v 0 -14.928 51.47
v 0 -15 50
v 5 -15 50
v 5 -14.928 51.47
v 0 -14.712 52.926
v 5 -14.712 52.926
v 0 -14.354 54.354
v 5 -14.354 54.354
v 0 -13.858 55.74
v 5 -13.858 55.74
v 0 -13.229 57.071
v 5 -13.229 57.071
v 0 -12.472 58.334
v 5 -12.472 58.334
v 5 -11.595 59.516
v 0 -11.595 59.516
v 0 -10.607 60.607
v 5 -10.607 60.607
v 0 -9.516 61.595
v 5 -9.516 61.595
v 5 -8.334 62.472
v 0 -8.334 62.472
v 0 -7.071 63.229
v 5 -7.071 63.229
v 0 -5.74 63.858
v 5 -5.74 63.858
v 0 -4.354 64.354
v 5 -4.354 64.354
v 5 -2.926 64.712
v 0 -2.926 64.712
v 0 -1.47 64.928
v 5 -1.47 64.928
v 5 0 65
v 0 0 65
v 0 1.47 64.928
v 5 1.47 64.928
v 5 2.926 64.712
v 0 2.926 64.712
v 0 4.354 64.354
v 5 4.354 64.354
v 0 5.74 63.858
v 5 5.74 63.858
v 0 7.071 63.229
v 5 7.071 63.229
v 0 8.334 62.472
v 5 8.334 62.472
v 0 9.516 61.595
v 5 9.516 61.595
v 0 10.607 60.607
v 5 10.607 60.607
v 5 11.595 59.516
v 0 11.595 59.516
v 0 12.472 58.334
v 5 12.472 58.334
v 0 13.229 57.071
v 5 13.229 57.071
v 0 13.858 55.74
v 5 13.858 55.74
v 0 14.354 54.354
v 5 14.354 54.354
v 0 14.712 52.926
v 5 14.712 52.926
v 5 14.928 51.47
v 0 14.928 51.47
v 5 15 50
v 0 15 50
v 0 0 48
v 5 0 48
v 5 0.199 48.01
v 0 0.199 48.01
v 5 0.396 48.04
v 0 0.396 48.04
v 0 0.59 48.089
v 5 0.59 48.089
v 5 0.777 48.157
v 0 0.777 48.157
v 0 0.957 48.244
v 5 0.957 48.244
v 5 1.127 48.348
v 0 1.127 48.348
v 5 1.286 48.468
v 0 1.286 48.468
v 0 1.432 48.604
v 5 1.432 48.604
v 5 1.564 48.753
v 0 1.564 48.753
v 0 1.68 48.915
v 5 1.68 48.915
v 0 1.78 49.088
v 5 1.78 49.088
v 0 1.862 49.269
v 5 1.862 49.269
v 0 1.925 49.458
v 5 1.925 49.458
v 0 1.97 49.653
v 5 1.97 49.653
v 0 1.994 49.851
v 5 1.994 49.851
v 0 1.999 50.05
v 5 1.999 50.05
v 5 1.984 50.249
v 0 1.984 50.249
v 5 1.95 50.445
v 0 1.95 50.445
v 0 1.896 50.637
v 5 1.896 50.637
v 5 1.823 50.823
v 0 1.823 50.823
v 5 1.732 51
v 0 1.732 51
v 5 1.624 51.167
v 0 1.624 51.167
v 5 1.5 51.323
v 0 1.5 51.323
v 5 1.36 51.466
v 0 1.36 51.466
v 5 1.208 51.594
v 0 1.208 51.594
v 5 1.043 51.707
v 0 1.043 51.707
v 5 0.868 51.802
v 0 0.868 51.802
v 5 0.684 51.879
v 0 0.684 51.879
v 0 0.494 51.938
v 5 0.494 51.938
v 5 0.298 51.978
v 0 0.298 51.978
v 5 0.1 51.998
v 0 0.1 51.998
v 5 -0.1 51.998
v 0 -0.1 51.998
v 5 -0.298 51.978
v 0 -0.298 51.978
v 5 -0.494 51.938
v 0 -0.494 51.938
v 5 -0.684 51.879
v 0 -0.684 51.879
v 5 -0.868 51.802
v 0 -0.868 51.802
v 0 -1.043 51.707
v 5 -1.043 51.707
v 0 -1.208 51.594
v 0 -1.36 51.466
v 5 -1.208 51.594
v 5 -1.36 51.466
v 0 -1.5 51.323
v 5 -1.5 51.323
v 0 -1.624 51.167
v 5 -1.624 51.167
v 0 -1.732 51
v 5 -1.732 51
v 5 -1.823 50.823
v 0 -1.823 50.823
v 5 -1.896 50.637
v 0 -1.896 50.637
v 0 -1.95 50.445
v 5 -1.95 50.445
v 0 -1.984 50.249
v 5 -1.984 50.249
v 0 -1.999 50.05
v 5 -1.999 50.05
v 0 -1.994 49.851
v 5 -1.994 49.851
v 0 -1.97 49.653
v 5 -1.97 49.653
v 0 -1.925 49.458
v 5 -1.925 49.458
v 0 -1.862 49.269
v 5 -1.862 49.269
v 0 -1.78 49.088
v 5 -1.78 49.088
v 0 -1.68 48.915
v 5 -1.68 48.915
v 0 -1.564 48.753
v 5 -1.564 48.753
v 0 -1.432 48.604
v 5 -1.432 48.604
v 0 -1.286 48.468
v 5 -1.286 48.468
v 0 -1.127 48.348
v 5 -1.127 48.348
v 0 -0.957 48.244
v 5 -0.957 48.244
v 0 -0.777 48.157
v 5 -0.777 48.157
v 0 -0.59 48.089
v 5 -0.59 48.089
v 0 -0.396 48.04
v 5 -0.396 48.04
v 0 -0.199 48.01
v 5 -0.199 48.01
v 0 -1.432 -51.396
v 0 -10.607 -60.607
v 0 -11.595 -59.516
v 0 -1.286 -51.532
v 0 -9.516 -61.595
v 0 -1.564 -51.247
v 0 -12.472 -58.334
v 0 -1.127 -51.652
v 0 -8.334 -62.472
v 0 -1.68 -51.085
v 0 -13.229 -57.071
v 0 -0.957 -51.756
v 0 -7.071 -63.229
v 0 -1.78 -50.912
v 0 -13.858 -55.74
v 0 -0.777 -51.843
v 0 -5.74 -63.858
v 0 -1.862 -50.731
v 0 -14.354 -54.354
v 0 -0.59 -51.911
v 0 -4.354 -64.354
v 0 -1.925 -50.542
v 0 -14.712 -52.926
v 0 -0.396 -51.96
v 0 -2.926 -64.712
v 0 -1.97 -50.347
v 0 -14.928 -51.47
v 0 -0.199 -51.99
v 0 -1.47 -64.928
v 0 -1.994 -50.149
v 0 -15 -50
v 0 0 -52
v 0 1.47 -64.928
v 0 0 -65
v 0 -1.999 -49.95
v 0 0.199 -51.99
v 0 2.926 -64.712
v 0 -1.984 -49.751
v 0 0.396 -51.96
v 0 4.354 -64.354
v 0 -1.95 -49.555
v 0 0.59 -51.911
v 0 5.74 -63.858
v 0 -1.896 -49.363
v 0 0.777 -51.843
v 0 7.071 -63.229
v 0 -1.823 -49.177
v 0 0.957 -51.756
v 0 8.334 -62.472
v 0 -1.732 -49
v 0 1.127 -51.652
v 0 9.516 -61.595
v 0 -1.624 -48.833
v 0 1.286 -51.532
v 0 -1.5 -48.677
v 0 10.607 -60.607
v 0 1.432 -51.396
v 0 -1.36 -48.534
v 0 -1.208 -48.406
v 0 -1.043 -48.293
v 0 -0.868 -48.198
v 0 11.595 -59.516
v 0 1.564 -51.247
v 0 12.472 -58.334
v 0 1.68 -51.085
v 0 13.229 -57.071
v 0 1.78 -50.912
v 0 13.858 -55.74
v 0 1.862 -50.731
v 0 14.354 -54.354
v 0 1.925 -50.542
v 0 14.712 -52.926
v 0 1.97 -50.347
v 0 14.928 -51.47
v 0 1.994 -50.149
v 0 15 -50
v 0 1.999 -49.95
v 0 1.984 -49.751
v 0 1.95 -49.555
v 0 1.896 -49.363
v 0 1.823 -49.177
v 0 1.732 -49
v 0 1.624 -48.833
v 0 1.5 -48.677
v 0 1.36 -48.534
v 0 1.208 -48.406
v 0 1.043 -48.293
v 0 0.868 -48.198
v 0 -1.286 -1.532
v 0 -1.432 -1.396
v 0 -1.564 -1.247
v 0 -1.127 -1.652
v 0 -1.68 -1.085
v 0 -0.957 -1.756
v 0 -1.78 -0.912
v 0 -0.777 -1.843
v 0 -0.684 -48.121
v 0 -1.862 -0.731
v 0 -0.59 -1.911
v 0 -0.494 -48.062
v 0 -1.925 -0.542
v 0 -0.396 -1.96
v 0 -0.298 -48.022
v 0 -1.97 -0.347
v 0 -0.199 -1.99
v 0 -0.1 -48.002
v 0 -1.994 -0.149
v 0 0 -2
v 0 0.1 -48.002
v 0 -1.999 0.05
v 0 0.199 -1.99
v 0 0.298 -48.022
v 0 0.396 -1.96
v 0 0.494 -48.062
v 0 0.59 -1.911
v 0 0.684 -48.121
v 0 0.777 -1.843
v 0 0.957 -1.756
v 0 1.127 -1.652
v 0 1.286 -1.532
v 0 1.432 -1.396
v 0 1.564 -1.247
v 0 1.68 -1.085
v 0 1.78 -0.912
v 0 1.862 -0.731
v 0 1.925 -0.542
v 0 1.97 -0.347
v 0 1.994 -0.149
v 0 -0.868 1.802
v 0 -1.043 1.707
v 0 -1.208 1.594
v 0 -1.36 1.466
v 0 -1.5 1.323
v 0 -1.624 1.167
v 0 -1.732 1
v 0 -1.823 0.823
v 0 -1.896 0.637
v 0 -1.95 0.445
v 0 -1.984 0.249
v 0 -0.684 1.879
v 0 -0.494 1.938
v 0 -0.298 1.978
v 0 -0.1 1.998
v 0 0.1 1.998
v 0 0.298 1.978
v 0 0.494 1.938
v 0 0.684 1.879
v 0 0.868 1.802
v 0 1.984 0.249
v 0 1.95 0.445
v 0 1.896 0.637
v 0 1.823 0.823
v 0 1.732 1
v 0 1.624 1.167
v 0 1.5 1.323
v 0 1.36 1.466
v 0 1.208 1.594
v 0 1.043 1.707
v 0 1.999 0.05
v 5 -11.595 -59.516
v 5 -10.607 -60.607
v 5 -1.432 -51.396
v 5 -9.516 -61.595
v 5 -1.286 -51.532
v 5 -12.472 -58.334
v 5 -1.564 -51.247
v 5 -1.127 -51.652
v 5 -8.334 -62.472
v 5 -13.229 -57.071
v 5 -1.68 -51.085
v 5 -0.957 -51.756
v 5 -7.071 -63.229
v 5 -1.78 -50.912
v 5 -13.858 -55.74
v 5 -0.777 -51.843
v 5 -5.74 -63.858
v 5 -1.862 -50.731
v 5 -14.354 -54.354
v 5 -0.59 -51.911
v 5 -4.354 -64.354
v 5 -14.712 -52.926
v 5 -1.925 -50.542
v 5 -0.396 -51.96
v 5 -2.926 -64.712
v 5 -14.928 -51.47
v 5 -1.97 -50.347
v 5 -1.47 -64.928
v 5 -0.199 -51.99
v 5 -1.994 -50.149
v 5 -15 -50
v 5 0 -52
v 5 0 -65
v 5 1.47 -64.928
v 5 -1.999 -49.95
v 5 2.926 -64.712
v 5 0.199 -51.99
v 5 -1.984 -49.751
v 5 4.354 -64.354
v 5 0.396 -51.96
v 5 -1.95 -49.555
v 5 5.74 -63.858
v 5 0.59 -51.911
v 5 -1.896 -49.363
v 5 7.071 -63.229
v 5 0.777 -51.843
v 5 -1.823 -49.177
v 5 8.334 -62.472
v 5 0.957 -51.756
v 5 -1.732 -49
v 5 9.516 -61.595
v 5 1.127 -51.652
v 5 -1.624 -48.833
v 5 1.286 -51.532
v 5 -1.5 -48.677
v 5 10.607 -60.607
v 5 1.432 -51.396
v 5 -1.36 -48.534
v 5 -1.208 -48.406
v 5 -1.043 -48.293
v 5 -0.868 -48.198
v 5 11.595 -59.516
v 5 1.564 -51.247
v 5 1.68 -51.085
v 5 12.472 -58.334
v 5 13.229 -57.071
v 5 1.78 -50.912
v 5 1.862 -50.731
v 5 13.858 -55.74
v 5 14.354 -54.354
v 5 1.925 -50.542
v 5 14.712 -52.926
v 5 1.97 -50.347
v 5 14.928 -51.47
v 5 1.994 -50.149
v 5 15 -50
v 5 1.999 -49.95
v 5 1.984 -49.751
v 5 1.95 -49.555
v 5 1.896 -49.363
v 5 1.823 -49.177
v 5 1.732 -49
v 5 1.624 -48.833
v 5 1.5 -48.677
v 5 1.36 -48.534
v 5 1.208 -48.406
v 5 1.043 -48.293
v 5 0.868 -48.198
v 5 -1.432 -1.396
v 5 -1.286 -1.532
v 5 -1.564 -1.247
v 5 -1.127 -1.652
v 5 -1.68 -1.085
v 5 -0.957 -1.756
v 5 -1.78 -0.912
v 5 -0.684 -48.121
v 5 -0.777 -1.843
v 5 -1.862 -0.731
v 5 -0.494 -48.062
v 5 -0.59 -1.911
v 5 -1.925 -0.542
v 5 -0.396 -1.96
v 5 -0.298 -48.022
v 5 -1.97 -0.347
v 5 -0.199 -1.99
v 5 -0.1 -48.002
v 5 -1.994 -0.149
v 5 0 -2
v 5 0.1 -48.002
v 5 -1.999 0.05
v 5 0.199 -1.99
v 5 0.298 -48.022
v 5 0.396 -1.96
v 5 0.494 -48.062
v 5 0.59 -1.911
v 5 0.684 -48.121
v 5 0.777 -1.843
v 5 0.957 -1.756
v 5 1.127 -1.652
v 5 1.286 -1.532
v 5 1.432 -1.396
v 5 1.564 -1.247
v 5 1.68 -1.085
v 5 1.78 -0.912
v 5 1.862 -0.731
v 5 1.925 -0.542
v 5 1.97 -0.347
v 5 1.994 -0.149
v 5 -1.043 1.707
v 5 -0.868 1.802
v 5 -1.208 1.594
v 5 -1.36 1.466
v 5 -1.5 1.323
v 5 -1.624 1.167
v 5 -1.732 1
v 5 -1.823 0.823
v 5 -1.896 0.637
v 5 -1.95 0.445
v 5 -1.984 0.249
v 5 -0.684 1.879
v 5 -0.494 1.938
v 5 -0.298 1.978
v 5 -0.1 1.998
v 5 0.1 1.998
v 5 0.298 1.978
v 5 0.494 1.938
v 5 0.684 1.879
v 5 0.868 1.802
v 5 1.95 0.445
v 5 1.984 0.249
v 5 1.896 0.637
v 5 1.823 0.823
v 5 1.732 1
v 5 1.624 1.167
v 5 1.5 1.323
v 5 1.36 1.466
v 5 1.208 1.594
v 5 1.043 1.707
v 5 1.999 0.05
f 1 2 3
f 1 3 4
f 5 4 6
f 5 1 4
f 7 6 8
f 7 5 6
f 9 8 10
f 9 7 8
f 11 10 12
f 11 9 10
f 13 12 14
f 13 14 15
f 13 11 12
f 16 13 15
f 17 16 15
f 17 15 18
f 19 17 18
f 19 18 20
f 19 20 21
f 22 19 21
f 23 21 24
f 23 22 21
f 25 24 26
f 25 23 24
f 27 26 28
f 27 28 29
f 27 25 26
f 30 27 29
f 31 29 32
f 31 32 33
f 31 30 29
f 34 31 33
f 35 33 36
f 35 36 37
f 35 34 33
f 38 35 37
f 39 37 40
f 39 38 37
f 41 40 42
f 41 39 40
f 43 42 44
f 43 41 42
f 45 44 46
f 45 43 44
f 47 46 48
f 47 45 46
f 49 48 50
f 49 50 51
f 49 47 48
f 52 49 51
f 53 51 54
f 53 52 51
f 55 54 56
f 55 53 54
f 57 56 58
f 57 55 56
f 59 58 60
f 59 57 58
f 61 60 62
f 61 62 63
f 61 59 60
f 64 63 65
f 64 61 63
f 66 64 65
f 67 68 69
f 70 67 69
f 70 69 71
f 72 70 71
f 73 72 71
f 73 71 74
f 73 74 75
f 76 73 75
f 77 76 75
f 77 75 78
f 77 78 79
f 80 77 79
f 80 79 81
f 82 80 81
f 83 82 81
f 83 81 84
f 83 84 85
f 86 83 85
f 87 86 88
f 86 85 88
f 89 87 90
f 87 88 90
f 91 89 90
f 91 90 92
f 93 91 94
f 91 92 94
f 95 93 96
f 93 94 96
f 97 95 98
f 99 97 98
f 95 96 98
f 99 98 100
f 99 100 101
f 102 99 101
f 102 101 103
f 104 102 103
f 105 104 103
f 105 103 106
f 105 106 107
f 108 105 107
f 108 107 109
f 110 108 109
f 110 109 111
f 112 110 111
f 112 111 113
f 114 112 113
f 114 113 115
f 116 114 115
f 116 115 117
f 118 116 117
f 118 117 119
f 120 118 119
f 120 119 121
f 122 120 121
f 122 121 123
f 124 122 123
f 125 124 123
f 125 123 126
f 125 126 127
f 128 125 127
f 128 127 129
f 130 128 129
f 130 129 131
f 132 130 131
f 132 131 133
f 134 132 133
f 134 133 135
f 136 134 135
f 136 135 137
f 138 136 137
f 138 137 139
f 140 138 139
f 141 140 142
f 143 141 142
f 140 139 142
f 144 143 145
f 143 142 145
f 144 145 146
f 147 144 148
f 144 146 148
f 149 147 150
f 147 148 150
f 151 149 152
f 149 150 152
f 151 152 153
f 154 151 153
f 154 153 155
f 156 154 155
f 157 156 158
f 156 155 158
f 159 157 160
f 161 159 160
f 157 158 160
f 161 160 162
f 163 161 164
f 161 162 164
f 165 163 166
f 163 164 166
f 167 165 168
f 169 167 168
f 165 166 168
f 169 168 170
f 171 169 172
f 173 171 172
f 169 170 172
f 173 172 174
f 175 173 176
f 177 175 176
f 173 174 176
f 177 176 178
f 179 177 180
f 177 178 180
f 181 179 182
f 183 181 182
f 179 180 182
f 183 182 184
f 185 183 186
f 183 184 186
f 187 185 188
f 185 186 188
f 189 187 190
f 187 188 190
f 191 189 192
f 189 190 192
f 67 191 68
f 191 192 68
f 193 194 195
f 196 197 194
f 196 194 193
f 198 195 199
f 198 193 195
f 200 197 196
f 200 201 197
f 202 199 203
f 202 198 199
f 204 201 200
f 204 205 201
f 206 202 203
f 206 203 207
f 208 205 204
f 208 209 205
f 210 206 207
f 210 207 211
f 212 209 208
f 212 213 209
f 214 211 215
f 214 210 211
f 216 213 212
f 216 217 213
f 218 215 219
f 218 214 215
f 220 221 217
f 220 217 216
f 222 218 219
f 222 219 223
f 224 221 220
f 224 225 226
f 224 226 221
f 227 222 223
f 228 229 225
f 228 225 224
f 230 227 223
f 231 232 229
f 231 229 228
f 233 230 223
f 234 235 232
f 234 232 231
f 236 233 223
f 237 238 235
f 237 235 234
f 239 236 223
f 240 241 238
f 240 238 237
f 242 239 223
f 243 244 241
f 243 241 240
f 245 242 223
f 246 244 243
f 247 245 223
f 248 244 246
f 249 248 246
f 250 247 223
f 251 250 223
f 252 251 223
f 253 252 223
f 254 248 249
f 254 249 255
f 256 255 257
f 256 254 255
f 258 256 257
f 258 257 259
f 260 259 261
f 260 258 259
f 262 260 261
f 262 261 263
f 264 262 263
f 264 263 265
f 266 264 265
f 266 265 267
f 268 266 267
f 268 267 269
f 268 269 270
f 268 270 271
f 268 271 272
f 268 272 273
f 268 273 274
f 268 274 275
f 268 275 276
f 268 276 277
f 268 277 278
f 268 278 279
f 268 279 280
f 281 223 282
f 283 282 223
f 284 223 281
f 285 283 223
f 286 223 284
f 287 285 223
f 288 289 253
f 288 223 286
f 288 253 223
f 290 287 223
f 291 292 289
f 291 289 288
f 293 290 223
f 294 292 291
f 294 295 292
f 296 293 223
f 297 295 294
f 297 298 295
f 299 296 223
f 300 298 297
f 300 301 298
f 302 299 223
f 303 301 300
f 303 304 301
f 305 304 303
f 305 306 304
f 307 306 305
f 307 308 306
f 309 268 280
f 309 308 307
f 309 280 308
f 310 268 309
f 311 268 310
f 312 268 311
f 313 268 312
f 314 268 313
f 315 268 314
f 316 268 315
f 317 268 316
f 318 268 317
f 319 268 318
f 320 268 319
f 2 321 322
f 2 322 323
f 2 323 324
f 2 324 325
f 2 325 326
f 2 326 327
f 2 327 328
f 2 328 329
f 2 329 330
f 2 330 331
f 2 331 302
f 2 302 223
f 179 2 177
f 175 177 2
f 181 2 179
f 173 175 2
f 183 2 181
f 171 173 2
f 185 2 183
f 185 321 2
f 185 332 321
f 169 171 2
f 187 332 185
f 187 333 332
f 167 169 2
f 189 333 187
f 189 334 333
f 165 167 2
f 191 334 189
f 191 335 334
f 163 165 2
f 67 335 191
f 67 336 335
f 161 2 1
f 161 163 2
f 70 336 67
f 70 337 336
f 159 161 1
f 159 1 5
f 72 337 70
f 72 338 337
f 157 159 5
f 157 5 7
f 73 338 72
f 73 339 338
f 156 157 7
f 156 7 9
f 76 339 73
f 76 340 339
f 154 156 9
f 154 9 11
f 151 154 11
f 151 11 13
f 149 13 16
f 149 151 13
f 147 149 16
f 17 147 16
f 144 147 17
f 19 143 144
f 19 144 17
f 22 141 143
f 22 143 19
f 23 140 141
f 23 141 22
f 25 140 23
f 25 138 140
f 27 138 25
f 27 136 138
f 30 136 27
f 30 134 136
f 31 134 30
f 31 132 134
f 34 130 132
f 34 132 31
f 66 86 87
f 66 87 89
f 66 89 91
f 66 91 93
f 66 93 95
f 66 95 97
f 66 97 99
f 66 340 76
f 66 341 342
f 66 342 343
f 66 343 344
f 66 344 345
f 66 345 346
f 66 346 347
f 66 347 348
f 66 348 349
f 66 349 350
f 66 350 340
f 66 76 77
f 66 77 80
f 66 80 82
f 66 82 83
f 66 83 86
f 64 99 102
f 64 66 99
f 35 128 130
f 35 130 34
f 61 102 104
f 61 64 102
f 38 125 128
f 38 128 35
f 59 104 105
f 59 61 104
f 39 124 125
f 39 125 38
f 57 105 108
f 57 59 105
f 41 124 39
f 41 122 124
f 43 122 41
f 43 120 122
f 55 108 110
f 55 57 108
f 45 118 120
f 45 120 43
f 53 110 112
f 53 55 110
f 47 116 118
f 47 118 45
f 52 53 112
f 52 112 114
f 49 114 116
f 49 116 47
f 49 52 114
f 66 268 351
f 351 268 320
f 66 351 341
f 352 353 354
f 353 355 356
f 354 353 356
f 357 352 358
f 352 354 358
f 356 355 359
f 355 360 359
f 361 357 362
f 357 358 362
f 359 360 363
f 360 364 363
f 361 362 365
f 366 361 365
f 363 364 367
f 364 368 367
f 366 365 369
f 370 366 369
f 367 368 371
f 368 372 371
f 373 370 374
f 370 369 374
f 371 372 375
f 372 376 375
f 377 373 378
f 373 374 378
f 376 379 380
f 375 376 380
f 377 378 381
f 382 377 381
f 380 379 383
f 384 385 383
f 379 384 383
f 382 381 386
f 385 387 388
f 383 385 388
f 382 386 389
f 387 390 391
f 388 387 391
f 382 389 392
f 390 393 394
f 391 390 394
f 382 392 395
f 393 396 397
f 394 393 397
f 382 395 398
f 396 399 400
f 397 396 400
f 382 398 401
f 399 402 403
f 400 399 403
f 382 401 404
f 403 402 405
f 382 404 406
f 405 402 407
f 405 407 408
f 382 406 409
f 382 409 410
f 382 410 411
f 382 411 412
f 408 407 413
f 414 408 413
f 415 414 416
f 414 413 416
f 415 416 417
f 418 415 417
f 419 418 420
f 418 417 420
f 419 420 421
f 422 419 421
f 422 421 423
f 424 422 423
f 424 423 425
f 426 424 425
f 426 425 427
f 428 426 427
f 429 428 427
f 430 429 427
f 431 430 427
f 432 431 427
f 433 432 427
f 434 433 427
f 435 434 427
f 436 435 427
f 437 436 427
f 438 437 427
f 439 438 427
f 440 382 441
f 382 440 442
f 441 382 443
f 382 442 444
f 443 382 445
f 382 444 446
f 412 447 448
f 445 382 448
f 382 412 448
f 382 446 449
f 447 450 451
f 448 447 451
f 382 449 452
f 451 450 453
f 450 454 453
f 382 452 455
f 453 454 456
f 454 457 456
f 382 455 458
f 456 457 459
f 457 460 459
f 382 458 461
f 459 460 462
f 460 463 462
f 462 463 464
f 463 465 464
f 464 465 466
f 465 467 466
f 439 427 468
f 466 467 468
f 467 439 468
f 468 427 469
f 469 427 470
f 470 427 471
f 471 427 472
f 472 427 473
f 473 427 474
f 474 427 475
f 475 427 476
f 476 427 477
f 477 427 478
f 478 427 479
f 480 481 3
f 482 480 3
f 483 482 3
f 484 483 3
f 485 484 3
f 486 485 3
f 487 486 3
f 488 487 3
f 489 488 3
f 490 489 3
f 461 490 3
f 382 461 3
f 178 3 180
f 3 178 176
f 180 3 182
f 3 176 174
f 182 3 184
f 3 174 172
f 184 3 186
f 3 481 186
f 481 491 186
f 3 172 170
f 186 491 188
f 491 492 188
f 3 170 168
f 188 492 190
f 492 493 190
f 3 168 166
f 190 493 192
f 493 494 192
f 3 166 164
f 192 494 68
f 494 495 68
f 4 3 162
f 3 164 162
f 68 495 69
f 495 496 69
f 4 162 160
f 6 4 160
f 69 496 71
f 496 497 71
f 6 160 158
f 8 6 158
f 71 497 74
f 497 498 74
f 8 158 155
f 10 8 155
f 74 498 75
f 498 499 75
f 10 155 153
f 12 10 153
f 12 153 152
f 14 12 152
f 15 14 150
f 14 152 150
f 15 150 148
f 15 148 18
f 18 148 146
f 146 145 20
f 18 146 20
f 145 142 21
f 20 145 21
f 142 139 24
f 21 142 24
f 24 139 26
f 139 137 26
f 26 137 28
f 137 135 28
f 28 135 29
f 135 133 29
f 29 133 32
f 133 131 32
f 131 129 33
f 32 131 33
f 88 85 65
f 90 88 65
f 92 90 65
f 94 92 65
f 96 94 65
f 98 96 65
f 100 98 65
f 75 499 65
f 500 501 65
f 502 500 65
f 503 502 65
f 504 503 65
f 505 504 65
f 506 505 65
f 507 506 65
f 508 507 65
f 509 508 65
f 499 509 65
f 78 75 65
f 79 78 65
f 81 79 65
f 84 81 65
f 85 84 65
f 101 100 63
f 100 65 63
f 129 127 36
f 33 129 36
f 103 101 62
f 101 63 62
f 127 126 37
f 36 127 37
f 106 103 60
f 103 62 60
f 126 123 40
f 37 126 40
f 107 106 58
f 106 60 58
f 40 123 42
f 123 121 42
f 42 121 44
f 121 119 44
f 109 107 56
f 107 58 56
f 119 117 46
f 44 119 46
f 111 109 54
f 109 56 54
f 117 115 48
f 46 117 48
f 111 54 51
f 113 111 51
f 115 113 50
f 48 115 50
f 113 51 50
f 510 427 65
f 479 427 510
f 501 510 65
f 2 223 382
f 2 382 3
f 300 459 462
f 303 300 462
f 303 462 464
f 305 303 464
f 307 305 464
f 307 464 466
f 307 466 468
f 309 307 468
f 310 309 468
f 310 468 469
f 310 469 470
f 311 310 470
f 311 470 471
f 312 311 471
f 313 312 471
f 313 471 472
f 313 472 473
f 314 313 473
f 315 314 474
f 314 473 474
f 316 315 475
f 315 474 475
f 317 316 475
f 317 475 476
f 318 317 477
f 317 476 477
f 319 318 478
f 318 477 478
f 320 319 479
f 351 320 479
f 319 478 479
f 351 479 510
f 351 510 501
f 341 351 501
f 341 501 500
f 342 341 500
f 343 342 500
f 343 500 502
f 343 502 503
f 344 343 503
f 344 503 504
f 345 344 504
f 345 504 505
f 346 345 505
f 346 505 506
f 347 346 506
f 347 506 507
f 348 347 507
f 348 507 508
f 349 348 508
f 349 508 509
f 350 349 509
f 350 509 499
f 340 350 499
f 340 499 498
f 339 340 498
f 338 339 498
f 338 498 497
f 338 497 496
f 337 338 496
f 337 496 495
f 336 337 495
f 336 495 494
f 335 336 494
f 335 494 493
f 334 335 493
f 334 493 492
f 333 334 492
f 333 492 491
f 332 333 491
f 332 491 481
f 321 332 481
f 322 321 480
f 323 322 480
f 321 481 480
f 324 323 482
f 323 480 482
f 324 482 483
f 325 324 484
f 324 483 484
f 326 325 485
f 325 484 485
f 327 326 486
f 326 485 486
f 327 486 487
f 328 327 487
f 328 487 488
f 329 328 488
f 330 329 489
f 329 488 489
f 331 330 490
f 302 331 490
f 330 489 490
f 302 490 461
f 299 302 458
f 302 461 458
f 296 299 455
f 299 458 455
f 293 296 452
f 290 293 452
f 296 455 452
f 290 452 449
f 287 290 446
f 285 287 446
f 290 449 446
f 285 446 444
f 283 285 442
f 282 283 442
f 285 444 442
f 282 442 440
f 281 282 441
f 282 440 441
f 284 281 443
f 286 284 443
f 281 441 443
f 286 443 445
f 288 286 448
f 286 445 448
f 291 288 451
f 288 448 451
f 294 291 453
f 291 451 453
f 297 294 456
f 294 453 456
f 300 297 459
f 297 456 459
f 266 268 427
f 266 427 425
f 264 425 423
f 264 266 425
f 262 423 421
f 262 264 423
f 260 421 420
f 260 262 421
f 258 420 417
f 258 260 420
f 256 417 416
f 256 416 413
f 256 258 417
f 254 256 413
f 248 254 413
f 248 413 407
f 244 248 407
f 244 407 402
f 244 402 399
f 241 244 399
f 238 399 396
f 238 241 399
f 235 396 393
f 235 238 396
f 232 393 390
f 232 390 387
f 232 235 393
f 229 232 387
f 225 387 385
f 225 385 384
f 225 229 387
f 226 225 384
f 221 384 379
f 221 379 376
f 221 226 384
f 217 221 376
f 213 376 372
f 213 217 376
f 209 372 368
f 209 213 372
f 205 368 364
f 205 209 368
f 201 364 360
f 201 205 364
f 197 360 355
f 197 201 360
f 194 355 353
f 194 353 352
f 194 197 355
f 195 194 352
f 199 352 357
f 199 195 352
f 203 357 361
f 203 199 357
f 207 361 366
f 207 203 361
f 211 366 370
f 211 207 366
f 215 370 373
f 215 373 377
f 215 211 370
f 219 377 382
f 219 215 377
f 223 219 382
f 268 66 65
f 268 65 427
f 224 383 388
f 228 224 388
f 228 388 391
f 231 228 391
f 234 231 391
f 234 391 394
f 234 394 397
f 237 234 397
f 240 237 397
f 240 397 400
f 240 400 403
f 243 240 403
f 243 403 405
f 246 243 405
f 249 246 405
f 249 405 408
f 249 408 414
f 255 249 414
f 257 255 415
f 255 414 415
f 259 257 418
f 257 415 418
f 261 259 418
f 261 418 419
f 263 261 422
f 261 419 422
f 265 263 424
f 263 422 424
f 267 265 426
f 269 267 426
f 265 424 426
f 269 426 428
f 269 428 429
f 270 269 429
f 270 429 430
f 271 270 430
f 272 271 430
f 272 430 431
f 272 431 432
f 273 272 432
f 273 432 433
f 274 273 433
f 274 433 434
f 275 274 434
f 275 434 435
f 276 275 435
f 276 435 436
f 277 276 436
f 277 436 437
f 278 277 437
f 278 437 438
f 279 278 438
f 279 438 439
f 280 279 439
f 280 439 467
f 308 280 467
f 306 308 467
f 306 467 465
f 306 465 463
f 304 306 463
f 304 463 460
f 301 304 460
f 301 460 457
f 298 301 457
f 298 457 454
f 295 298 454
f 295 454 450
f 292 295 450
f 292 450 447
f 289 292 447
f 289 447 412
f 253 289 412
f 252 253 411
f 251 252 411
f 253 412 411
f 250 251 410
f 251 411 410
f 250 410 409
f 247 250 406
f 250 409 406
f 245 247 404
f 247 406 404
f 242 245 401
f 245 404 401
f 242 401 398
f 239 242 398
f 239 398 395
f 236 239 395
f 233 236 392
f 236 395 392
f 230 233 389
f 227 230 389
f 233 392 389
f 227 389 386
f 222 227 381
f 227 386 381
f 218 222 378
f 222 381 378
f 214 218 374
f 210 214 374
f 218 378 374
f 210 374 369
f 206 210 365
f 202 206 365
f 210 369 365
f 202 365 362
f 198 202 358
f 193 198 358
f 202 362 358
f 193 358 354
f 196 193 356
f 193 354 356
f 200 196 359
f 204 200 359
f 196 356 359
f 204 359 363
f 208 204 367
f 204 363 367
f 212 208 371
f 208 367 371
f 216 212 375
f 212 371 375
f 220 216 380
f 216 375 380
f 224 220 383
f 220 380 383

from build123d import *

# Parameters (mm, degrees)
ESTRUSIONE_ESTRUSIONE1_DEPTH = 5
SCHIZZO2_R                   = 2
TAGLIO_ESTRUSIONE1_DEPTH     = 6


with BuildPart() as part:
    # Schizzo1 → Estrusione-Estrusione1 (new body)
    with BuildSketch(Plane(origin=(0, 0, 0), x_dir=(0, 0, -1), z_dir=(1, 0, 0))):
        with BuildLine():
            Line((-50, 15), (50, 15))
            ThreePointArc((50, 15), (65, 0), (50, -15))
            Line((50, -15), (-50, -15))
            ThreePointArc((-50, -15), (-65, 0), (-50, 15))
        make_face()
    extrude(amount=ESTRUSIONE_ESTRUSIONE1_DEPTH)

    # Schizzo2 → Taglio-Estrusione1 (cut, through all)
    with BuildSketch(Plane(origin=(5, 0, 0), x_dir=(0, 0, -1), z_dir=(1, 0, 0))):
        with Locations((-50, 0)):
            Circle(SCHIZZO2_R)
        Circle(SCHIZZO2_R)
        with Locations((50, 0)):
            Circle(SCHIZZO2_R)
    extrude(amount=-TAGLIO_ESTRUSIONE1_DEPTH, mode=Mode.SUBTRACT)


solid = part.part
